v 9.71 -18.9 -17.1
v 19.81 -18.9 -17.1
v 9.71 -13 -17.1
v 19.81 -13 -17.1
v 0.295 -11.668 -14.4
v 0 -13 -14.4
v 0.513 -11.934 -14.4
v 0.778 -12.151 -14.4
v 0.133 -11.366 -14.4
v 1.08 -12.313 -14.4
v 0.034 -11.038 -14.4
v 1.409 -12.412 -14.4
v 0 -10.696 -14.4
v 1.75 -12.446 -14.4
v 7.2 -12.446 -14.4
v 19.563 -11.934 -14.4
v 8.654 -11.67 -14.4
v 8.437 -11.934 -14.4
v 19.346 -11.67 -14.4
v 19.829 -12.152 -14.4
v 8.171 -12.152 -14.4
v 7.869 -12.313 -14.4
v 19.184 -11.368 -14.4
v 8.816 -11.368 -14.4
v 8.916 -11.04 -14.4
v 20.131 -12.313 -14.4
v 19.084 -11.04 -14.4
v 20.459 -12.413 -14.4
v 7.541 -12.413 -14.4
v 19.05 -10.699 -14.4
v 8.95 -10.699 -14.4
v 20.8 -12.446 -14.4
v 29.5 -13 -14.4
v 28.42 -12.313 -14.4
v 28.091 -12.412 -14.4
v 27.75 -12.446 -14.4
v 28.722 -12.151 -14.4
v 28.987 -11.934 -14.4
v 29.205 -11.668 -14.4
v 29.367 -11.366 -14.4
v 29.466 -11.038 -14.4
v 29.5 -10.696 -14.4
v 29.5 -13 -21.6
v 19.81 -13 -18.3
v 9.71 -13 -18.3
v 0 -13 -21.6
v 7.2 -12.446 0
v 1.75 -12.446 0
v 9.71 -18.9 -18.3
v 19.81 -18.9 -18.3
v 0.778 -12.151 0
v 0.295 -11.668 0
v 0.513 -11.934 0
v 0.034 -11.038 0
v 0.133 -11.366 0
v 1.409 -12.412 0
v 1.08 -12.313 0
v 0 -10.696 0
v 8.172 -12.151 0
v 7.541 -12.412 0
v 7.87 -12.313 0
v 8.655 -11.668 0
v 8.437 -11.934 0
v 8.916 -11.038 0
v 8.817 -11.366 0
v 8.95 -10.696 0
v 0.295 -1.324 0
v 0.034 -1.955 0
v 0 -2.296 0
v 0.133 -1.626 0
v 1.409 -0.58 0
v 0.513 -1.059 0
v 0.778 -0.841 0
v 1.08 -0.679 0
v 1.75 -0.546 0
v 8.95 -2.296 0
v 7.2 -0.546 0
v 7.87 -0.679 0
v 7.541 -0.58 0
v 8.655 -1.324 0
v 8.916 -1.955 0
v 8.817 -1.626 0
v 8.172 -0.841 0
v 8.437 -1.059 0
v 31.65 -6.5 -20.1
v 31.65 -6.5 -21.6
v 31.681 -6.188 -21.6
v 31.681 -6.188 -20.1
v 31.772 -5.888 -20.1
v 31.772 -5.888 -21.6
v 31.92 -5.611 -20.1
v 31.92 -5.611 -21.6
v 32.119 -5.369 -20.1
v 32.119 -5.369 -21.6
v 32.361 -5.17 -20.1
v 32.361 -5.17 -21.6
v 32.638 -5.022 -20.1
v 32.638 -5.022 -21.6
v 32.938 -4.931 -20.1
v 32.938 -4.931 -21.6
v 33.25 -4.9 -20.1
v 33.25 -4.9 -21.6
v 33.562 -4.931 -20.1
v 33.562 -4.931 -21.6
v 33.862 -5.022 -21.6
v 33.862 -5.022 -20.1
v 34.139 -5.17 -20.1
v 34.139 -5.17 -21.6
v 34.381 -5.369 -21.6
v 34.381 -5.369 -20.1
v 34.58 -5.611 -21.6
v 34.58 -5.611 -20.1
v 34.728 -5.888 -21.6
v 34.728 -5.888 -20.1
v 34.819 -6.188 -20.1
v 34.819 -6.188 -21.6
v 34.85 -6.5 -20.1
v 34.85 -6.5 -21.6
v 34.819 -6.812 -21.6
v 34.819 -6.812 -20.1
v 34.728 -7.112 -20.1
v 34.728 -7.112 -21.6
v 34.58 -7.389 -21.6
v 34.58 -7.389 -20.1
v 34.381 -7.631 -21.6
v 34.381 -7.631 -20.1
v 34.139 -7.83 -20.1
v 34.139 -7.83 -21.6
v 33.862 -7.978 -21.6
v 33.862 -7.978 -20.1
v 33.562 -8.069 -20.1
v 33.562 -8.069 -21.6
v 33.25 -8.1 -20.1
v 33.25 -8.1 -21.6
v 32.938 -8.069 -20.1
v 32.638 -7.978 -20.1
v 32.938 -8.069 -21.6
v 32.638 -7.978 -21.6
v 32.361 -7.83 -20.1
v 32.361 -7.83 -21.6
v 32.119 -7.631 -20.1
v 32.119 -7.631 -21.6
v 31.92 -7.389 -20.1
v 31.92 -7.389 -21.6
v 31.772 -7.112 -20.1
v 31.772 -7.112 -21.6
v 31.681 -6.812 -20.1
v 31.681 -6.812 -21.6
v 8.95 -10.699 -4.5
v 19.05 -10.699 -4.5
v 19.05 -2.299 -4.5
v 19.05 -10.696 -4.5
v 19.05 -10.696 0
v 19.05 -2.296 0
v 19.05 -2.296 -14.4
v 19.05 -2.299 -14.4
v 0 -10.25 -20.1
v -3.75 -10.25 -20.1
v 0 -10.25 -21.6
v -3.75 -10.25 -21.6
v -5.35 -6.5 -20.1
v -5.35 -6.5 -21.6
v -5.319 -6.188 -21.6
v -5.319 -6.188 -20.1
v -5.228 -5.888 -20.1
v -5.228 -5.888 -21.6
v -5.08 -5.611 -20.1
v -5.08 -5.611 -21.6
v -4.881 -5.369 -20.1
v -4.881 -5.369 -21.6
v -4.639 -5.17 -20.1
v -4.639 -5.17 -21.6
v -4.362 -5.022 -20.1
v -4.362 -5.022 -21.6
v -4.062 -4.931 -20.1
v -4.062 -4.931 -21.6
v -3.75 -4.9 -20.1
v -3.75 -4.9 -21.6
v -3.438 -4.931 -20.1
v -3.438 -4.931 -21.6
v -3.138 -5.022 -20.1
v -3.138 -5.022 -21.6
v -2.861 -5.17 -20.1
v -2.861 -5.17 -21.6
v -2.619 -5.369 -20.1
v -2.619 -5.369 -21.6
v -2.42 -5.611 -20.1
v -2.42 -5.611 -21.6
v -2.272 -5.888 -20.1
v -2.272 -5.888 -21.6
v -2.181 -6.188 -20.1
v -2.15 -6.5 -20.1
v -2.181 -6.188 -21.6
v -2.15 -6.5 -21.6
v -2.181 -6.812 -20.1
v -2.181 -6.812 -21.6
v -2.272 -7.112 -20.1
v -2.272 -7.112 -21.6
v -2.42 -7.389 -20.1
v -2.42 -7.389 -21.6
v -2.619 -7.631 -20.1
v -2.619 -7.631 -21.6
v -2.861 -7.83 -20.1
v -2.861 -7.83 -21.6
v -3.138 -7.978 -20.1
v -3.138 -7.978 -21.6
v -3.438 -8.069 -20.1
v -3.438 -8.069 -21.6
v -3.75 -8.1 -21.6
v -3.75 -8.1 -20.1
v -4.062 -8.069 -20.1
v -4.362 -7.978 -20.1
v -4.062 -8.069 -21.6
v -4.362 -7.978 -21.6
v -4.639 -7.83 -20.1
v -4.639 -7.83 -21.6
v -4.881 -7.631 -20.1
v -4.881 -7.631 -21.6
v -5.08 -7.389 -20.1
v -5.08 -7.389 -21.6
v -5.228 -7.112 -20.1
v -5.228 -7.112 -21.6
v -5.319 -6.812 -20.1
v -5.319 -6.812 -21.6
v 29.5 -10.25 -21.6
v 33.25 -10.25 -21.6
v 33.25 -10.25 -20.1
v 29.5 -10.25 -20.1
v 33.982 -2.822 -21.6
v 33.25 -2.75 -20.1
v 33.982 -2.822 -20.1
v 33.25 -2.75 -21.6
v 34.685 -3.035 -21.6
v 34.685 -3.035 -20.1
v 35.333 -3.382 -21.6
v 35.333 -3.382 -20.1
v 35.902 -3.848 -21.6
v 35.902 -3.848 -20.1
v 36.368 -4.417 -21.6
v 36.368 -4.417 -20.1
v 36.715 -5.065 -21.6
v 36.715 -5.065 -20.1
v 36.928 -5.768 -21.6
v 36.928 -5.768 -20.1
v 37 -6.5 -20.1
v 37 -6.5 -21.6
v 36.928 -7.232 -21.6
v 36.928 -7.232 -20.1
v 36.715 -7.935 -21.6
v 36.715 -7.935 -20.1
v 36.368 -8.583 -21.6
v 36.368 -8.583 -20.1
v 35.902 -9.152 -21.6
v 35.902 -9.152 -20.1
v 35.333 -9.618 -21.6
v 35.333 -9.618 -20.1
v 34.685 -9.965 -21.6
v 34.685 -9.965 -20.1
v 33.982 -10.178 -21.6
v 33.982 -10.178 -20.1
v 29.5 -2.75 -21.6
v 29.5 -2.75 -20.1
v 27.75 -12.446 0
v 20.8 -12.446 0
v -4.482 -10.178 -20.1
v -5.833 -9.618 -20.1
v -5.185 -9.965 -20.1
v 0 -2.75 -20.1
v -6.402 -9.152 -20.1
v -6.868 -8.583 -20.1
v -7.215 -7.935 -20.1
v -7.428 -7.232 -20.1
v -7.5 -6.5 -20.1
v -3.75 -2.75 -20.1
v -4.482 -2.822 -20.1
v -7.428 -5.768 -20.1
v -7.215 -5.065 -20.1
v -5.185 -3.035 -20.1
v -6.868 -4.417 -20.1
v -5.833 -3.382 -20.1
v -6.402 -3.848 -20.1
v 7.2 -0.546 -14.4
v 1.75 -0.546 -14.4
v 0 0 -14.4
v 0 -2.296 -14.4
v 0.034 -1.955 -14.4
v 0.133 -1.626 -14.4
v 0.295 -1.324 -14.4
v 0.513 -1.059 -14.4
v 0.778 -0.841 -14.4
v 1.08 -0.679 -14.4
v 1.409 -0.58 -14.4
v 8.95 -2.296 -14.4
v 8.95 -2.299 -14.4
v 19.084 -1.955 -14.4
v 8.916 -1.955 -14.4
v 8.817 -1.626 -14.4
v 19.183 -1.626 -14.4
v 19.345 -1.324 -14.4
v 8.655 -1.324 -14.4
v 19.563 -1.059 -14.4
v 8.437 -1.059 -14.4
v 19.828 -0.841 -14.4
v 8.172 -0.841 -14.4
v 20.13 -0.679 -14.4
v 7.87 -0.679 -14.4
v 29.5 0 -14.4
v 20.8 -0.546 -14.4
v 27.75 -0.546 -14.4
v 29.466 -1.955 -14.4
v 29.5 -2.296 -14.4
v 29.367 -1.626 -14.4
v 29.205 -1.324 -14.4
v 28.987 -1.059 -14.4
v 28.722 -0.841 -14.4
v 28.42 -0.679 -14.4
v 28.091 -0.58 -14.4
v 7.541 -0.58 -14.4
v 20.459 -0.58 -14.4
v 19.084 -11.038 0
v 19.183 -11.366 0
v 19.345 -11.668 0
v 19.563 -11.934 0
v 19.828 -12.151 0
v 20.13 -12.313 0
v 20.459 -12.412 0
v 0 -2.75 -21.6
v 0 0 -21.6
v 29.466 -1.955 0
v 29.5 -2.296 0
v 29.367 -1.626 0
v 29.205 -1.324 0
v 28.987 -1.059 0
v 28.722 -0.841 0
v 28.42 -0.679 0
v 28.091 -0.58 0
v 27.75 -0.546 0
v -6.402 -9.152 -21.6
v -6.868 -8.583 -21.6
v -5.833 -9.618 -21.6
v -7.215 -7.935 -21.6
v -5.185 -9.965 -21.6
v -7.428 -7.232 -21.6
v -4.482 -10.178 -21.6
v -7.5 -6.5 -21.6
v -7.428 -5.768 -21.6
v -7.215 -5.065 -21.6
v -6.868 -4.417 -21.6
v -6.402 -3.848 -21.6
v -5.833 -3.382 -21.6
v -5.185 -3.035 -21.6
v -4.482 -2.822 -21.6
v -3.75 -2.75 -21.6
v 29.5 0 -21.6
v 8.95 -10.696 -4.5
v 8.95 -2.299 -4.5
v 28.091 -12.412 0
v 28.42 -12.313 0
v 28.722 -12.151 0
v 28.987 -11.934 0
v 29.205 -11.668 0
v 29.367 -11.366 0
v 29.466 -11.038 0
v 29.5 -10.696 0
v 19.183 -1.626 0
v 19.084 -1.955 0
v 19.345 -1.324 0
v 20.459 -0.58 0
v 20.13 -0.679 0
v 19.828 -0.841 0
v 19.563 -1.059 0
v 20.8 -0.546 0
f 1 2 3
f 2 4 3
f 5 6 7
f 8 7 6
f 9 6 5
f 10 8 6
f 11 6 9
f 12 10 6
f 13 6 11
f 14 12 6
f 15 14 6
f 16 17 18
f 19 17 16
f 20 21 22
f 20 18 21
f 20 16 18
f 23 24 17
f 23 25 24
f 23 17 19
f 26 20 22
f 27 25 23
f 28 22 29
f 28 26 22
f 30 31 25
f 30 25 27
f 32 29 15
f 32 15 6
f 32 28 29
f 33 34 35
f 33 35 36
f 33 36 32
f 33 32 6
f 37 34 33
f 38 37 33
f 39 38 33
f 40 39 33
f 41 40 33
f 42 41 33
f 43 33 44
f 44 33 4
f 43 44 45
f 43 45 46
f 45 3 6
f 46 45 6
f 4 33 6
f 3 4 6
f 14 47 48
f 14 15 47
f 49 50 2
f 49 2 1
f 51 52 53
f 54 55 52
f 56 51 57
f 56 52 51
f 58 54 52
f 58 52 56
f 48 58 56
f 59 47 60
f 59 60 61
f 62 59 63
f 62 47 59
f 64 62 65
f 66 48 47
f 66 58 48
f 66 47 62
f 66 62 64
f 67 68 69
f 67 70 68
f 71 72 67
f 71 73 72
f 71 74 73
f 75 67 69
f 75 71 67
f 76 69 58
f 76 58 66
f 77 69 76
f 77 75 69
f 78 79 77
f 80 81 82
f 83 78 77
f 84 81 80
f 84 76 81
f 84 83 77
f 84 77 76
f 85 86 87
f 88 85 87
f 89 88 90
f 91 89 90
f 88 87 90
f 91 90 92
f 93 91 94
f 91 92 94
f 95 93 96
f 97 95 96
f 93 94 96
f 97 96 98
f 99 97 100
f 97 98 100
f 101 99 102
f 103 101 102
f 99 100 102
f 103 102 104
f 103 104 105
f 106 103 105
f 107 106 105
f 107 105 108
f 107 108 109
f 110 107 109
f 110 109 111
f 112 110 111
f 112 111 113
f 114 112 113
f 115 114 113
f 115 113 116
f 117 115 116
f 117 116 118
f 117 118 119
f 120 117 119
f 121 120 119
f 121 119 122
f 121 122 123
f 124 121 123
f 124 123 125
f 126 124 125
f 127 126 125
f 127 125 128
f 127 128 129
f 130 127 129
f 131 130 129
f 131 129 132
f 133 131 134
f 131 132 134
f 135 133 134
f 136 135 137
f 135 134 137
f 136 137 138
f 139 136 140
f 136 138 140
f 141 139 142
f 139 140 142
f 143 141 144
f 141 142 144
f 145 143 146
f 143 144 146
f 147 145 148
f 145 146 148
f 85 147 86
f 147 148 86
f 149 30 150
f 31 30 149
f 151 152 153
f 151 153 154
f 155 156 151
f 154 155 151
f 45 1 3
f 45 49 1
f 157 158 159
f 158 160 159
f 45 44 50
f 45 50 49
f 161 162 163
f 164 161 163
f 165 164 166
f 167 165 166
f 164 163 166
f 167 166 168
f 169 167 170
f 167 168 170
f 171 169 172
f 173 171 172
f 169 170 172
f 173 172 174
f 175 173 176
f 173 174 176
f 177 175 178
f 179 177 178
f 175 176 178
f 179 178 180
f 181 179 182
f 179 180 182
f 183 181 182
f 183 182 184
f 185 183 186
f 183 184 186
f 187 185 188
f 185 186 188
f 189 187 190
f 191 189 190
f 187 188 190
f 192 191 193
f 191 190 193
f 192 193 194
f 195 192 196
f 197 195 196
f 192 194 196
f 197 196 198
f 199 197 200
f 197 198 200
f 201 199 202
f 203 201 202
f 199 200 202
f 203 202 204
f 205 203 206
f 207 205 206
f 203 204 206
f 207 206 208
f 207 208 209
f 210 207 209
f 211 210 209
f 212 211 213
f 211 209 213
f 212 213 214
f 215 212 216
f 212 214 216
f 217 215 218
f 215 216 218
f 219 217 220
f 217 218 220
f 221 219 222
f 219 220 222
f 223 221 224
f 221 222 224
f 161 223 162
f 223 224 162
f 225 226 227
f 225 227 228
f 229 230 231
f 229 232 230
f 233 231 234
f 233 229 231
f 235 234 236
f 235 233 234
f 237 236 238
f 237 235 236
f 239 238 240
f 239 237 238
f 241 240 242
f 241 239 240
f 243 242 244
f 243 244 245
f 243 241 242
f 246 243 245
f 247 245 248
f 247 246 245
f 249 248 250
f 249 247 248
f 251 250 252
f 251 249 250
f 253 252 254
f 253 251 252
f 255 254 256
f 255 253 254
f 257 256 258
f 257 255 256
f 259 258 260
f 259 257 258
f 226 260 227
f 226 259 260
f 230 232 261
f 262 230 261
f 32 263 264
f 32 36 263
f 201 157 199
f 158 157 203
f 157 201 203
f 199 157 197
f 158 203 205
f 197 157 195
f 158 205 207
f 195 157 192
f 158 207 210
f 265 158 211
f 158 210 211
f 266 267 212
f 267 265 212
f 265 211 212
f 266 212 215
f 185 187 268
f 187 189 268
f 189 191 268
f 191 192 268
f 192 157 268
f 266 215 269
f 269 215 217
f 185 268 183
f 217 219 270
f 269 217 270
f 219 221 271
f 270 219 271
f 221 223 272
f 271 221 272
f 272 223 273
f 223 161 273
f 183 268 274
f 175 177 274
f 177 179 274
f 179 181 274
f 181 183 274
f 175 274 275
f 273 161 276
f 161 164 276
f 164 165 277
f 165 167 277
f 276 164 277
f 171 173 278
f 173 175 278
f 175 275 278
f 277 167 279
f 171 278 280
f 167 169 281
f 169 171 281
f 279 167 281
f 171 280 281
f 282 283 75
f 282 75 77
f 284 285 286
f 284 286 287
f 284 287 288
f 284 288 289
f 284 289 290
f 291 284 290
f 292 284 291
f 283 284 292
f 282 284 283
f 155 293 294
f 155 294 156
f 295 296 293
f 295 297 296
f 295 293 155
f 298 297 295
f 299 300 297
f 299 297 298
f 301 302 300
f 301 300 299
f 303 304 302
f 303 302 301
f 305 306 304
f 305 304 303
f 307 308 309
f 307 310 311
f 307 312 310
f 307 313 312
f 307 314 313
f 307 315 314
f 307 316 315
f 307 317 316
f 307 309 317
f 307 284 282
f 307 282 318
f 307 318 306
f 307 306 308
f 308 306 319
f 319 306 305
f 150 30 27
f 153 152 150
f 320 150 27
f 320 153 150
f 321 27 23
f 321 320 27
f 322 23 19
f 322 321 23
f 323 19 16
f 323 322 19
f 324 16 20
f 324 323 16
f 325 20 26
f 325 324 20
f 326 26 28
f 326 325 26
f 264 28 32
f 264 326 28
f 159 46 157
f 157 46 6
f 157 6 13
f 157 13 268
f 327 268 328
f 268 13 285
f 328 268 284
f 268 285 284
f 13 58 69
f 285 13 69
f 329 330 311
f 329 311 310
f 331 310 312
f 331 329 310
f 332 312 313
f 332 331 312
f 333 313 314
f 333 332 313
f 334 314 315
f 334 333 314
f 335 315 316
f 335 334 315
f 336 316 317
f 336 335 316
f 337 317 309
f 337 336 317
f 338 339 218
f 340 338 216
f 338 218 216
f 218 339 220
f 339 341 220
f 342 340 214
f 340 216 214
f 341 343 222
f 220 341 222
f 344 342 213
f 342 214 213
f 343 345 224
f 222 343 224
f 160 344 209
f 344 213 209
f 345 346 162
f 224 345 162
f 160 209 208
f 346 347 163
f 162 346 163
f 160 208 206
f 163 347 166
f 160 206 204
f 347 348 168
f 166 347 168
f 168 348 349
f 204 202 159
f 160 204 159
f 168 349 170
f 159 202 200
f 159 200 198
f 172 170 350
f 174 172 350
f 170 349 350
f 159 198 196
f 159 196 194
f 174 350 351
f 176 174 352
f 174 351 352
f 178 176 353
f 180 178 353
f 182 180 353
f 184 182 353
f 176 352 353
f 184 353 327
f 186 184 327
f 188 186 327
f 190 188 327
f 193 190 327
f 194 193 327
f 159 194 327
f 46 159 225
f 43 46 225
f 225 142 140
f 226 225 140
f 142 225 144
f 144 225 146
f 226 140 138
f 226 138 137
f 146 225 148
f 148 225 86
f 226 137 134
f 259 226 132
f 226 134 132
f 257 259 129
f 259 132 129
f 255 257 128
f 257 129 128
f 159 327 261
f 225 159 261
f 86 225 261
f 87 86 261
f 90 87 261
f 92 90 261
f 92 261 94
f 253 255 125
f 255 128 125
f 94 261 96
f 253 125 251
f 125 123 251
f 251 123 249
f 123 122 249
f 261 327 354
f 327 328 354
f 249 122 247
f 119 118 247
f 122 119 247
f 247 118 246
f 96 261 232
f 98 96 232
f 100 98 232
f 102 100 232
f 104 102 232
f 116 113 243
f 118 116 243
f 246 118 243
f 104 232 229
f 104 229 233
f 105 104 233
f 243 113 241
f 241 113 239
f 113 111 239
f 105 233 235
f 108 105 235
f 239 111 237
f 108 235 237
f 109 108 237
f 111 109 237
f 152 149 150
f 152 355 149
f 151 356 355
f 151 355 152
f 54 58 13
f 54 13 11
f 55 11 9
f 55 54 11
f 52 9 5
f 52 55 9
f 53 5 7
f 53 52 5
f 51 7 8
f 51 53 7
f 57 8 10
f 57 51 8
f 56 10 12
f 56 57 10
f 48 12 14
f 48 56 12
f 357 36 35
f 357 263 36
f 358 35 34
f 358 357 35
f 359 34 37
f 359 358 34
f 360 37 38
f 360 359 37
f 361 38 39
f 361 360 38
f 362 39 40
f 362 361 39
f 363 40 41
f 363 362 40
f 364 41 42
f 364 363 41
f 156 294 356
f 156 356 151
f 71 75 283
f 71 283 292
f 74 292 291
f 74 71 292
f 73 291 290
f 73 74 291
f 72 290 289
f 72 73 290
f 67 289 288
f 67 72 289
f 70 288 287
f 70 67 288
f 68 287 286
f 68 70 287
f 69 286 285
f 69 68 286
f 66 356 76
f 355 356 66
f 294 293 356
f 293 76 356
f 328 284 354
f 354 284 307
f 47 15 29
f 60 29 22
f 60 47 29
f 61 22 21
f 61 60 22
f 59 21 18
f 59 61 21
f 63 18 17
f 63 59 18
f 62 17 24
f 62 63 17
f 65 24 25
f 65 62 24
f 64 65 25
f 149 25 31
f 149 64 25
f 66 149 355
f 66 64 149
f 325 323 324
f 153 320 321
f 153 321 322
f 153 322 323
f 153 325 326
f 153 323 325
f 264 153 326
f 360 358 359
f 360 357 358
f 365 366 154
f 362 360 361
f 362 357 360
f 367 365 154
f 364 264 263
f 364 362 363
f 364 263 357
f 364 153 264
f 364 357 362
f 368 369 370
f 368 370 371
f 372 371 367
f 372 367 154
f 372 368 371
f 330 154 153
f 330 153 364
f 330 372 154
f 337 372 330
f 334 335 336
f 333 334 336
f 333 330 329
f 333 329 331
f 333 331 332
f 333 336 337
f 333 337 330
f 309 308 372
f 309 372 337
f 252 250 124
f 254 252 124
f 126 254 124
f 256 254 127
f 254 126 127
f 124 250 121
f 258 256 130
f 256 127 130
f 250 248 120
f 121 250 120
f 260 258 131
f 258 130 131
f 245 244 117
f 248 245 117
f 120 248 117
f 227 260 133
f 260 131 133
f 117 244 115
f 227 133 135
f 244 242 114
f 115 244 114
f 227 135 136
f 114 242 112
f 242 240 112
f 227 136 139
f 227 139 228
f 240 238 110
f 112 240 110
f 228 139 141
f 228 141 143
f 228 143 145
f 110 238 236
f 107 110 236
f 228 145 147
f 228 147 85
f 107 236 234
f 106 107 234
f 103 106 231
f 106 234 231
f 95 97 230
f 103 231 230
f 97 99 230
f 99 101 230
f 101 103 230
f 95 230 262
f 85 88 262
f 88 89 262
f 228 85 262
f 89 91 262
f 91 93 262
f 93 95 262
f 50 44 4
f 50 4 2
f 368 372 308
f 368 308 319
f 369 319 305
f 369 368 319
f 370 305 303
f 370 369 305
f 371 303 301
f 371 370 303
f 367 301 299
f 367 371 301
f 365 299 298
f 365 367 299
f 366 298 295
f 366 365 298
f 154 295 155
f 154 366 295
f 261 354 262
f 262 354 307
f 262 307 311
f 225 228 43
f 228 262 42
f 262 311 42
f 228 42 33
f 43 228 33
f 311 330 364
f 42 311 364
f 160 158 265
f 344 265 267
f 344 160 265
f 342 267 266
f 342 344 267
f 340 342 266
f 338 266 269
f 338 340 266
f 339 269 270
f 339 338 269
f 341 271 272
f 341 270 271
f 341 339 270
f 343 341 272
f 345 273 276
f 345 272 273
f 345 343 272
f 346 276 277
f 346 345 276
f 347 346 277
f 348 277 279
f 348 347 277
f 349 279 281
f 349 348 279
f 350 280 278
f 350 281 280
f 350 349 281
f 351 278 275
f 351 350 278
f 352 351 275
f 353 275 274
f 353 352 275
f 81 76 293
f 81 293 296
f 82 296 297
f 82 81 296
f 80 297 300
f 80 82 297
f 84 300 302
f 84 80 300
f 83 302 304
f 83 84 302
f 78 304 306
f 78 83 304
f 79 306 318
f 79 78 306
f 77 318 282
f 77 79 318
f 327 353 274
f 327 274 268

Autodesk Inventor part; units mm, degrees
ref_plane "YZ Plane" through (0, 0, 0) normal (1, 0, 0) x (0, 1, 0)
ref_plane "XZ Plane" through (0, 0, 0) normal (0, 1, 0) x (-1, 0, 0)
sketch "Sketch1" plane through (0, 0, 0) normal (0, 0, 1) x (1, 0, 0)
  line L0 (0, 0) -> (29.5, 0)
  line L1 (29.5, 0) -> (29.5, -18.9)
  line L2 (29.5, -18.9) -> (0, -18.9)
  line L3 (0, -18.9) -> (0, 0)
  dimension "d0" = 29.5
  dimension "d1" = 18.9
extrude "Extrusion1" add sketch "Sketch1" against normal blind 21.6
sketch "Sketch2" plane through (0, 0, 0) normal (0, 0, 1) x (1, 0, 0)
  line L0 (0, 0) -> (29.5, 0) projected
  line L1 (29.5, -18.9) -> (0, -18.9) projected
  line L2 (0, -18.9) -> (0, 0) projected
  line L3 (0, 0) -> (29.5, 0)
  line L4 (29.5, 0) -> (29.5, -13)
  line L5 (29.5, -13) -> (0, -13)
  line L6 (0, -13) -> (0, 0)
  line L7 (9.7099, -18.9) -> (19.8099, -18.9)
  line L8 (19.8099, -18.9) -> (19.8099, -13)
  line L9 (19.8099, -13) -> (9.7099, -13)
  line L10 (9.7099, -13) -> (9.7099, -18.9)
  line L11 (29.5, 0) -> (29.5, -18.9) projected
  dimension "d6" = 13
  dimension "d11" = 10.1
  dimension "d39" = 9.6901
extrude "Extrusion2" cut sketch "Sketch2" against normal blind 21.6 contours L5 L10 L1 L2 | L11 L1 L8 L5
sketch "Sketch4" plane through (0, 0, 0) normal (0, 0, 1) x (1, 0, 0)
  line L0 (9.7099, -13) -> (9.7099, -18.9) projected
  line L1 (29.5, -18.9) -> (0, -18.9) projected
  line L2 (19.8099, -18.9) -> (19.8099, -13) projected
  line L3 (19.8099, -13) -> (29.5, -13) projected
  line L4 (29.5, 0) -> (29.5, -18.9) projected
  line L5 (0, 0) -> (29.5, 0) projected
  line L6 (0, -18.9) -> (0, 0) projected
  line L7 (0, -13) -> (9.7099, -13) projected
extrude "Extrusion3" cut sketch "Sketch4" against normal blind 14.4 contours L7 L6 L5 L4 L3 L2 L1 L0
sketch "Sketch5" plane through (0, 0, -14.4) normal (0, 0, 1) x (1, 0, 0)
  line L0 (29.5, 0) -> (29.5, -13) projected
  line L1 (0, 0) -> (29.5, 0) projected
  line L2 (0, -13) -> (0, 0) projected
  line L3 (0, -0.5461) -> (8.95, -0.5461)
  line L4 (8.95, -0.5461) -> (8.95, -12.4461)
  line L5 (8.95, -12.4461) -> (0, -12.4461)
  line L6 (0, -12.4461) -> (0, -0.5461)
  line L7 (19.05, -0.5461) -> (29.5, -0.5461)
  line L8 (29.5, -0.5461) -> (29.5, -12.4461)
  line L9 (29.5, -12.4461) -> (19.05, -12.4461)
  line L10 (19.05, -12.4461) -> (19.05, -0.5461)
  point P0 (33.25, -13)
  dimension "d22" = 8.95
  dimension "d23" = 10.45
  dimension "d24" = 11.9
  dimension "d25" = 11.9
  dimension "d26" = 0.5461
  dimension "d27" = 0.5461
extrude "Extrusion4" add sketch "Sketch5" along normal blind 14.4
fillet "Fillet1" radius 1.75 8 edges at (8.95, -0.5461, -7.2) (8.95, -12.4461, -7.2) (0, -0.5461, -7.2) (29.5, -0.5461, -7.2) (19.05, -0.5461, -7.2) (29.5, -12.4461, -7.2) (0, -12.4461, -7.2) (19.05, -12.4461, -7.2)
sketch "Sketch6" plane through (0, 0, -14.4) normal (0, 0, 1) x (1, 0, 0)
  line L0 (19.05, -10.6961) -> (19.05, -2.2961) projected
  line L1 (0, 0) -> (29.5, 0) projected
  line L2 (8.95, -2.2961) -> (8.95, -10.6961) projected
  line L3 (8.95, -2.2987) -> (19.05, -2.2987)
  line L4 (19.05, -2.2987) -> (19.05, -10.6987)
  line L5 (19.05, -10.6987) -> (8.95, -10.6987)
  line L6 (8.95, -10.6987) -> (8.95, -2.2987)
  dimension "d31" = 8.4
  dimension "d32" = 2.2987
extrude "Extrusion5" add sketch "Sketch6" along normal blind 9.9
sketch "Sketch8" plane through (0, 0, -21.6) normal (0, 0, -1) x (-1, 0, 0)
  line L0 (-9.7099, -18.9) -> (-9.7099, -13) projected
  line L1 (-9.7099, -13) -> (0, -13) projected
  line L2 (0, -13) -> (0, 0) projected
  line L3 (0, 0) -> (-29.5, 0) projected
  line L4 (-29.5, 0) -> (-29.5, -13) projected
  line L5 (-29.5, -13) -> (-19.8099, -13) projected
  line L6 (-19.8099, -13) -> (-19.8099, -18.9) projected
  line L7 (-19.8099, -18.9) -> (-9.7099, -18.9) projected
  circle A0 centre (-33.25, -6.5) radius 3.75
  circle A1 centre (-33.25, -6.5) radius 1.6
  circle A2 centre (3.75, -6.5) radius 3.75
  circle A3 centre (3.75, -6.5) radius 1.6
  line L8 (-33.25, -2.75) -> (-29.5, -2.75)
  line L9 (-33.25, -10.25) -> (-29.5, -10.25)
  line L10 (3.75, -10.25) -> (0, -10.25)
  line L11 (3.75, -2.75) -> (0, -2.75)
  dimension "d40" = 37
  dimension "d41" = 7.5
  dimension "d42" = 3.2
  dimension "d43" = 7.5
  dimension "d44" = 3.2
  dimension "d46" = 29.5
extrude "Extrusion6" add sketch "Sketch8" against normal blind 1.5 contours L2 A2 L10 | L2 L11 A2 | A2 | L9 A0 L4 | A0 L8 L4 | A0
sketch "Sketch10" plane through (0, 0, -14.4) normal (0, 0, 1) x (1, 0, 0)
  line L0 (9.7099, -18.9) -> (9.7099, -13) projected
  line L1 (9.7099, -13) -> (19.8099, -13)
  line L2 (19.8099, -13) -> (19.8099, -18.9)
  line L3 (19.8099, -18.9) -> (9.7099, -18.9)
  line L4 (9.7099, -18.9) -> (9.7099, -13)
  point P0 (0, 0)
extrude "Extrusion7" cut sketch "Sketch10" against normal blind 6
ref_plane "Work Plane5" through (0, 0, -18.3) normal (0, 0, -1) x (-1, 0, 0)
sketch "Sketch11" plane through (0, 0, -18.3) normal (0, 0, -1) x (-1, 0, 0)
  line L0 (-19.8099, -18.9) -> (-9.7099, -18.9) projected
  line L1 (-9.7099, -13) -> (-19.8099, -13)
  line L2 (-19.8099, -13) -> (-19.8099, -18.9)
  line L3 (-19.8099, -18.9) -> (-9.7099, -18.9)
  line L4 (-9.7099, -18.9) -> (-9.7099, -13)
  point P0 (0, 0)
extrude "Extrusion8" add sketch "Sketch11" against normal blind 1.2
sketch "Sketch12" plane through (0, 0, -20.4) normal (0, 0, 1) x (1, 0, 0)
  line L0 (9.7099, -13) -> (0, -13) projected
  line L1 (19.8099, -13) -> (19.8099, -18.9) projected
  line L2 (9.7099, -13) -> (19.8099, -13)
  line L3 (19.8099, -13) -> (19.8099, -18.9)
  line L4 (19.8099, -18.9) -> (9.7099, -18.9)
  line L5 (9.7099, -18.9) -> (9.7099, -13)
  point P0 (0, 0)
extrude "Extrusion9" cut sketch "Sketch12" against normal blind 1.2
properties part number "Sharp 2Y0A02"
